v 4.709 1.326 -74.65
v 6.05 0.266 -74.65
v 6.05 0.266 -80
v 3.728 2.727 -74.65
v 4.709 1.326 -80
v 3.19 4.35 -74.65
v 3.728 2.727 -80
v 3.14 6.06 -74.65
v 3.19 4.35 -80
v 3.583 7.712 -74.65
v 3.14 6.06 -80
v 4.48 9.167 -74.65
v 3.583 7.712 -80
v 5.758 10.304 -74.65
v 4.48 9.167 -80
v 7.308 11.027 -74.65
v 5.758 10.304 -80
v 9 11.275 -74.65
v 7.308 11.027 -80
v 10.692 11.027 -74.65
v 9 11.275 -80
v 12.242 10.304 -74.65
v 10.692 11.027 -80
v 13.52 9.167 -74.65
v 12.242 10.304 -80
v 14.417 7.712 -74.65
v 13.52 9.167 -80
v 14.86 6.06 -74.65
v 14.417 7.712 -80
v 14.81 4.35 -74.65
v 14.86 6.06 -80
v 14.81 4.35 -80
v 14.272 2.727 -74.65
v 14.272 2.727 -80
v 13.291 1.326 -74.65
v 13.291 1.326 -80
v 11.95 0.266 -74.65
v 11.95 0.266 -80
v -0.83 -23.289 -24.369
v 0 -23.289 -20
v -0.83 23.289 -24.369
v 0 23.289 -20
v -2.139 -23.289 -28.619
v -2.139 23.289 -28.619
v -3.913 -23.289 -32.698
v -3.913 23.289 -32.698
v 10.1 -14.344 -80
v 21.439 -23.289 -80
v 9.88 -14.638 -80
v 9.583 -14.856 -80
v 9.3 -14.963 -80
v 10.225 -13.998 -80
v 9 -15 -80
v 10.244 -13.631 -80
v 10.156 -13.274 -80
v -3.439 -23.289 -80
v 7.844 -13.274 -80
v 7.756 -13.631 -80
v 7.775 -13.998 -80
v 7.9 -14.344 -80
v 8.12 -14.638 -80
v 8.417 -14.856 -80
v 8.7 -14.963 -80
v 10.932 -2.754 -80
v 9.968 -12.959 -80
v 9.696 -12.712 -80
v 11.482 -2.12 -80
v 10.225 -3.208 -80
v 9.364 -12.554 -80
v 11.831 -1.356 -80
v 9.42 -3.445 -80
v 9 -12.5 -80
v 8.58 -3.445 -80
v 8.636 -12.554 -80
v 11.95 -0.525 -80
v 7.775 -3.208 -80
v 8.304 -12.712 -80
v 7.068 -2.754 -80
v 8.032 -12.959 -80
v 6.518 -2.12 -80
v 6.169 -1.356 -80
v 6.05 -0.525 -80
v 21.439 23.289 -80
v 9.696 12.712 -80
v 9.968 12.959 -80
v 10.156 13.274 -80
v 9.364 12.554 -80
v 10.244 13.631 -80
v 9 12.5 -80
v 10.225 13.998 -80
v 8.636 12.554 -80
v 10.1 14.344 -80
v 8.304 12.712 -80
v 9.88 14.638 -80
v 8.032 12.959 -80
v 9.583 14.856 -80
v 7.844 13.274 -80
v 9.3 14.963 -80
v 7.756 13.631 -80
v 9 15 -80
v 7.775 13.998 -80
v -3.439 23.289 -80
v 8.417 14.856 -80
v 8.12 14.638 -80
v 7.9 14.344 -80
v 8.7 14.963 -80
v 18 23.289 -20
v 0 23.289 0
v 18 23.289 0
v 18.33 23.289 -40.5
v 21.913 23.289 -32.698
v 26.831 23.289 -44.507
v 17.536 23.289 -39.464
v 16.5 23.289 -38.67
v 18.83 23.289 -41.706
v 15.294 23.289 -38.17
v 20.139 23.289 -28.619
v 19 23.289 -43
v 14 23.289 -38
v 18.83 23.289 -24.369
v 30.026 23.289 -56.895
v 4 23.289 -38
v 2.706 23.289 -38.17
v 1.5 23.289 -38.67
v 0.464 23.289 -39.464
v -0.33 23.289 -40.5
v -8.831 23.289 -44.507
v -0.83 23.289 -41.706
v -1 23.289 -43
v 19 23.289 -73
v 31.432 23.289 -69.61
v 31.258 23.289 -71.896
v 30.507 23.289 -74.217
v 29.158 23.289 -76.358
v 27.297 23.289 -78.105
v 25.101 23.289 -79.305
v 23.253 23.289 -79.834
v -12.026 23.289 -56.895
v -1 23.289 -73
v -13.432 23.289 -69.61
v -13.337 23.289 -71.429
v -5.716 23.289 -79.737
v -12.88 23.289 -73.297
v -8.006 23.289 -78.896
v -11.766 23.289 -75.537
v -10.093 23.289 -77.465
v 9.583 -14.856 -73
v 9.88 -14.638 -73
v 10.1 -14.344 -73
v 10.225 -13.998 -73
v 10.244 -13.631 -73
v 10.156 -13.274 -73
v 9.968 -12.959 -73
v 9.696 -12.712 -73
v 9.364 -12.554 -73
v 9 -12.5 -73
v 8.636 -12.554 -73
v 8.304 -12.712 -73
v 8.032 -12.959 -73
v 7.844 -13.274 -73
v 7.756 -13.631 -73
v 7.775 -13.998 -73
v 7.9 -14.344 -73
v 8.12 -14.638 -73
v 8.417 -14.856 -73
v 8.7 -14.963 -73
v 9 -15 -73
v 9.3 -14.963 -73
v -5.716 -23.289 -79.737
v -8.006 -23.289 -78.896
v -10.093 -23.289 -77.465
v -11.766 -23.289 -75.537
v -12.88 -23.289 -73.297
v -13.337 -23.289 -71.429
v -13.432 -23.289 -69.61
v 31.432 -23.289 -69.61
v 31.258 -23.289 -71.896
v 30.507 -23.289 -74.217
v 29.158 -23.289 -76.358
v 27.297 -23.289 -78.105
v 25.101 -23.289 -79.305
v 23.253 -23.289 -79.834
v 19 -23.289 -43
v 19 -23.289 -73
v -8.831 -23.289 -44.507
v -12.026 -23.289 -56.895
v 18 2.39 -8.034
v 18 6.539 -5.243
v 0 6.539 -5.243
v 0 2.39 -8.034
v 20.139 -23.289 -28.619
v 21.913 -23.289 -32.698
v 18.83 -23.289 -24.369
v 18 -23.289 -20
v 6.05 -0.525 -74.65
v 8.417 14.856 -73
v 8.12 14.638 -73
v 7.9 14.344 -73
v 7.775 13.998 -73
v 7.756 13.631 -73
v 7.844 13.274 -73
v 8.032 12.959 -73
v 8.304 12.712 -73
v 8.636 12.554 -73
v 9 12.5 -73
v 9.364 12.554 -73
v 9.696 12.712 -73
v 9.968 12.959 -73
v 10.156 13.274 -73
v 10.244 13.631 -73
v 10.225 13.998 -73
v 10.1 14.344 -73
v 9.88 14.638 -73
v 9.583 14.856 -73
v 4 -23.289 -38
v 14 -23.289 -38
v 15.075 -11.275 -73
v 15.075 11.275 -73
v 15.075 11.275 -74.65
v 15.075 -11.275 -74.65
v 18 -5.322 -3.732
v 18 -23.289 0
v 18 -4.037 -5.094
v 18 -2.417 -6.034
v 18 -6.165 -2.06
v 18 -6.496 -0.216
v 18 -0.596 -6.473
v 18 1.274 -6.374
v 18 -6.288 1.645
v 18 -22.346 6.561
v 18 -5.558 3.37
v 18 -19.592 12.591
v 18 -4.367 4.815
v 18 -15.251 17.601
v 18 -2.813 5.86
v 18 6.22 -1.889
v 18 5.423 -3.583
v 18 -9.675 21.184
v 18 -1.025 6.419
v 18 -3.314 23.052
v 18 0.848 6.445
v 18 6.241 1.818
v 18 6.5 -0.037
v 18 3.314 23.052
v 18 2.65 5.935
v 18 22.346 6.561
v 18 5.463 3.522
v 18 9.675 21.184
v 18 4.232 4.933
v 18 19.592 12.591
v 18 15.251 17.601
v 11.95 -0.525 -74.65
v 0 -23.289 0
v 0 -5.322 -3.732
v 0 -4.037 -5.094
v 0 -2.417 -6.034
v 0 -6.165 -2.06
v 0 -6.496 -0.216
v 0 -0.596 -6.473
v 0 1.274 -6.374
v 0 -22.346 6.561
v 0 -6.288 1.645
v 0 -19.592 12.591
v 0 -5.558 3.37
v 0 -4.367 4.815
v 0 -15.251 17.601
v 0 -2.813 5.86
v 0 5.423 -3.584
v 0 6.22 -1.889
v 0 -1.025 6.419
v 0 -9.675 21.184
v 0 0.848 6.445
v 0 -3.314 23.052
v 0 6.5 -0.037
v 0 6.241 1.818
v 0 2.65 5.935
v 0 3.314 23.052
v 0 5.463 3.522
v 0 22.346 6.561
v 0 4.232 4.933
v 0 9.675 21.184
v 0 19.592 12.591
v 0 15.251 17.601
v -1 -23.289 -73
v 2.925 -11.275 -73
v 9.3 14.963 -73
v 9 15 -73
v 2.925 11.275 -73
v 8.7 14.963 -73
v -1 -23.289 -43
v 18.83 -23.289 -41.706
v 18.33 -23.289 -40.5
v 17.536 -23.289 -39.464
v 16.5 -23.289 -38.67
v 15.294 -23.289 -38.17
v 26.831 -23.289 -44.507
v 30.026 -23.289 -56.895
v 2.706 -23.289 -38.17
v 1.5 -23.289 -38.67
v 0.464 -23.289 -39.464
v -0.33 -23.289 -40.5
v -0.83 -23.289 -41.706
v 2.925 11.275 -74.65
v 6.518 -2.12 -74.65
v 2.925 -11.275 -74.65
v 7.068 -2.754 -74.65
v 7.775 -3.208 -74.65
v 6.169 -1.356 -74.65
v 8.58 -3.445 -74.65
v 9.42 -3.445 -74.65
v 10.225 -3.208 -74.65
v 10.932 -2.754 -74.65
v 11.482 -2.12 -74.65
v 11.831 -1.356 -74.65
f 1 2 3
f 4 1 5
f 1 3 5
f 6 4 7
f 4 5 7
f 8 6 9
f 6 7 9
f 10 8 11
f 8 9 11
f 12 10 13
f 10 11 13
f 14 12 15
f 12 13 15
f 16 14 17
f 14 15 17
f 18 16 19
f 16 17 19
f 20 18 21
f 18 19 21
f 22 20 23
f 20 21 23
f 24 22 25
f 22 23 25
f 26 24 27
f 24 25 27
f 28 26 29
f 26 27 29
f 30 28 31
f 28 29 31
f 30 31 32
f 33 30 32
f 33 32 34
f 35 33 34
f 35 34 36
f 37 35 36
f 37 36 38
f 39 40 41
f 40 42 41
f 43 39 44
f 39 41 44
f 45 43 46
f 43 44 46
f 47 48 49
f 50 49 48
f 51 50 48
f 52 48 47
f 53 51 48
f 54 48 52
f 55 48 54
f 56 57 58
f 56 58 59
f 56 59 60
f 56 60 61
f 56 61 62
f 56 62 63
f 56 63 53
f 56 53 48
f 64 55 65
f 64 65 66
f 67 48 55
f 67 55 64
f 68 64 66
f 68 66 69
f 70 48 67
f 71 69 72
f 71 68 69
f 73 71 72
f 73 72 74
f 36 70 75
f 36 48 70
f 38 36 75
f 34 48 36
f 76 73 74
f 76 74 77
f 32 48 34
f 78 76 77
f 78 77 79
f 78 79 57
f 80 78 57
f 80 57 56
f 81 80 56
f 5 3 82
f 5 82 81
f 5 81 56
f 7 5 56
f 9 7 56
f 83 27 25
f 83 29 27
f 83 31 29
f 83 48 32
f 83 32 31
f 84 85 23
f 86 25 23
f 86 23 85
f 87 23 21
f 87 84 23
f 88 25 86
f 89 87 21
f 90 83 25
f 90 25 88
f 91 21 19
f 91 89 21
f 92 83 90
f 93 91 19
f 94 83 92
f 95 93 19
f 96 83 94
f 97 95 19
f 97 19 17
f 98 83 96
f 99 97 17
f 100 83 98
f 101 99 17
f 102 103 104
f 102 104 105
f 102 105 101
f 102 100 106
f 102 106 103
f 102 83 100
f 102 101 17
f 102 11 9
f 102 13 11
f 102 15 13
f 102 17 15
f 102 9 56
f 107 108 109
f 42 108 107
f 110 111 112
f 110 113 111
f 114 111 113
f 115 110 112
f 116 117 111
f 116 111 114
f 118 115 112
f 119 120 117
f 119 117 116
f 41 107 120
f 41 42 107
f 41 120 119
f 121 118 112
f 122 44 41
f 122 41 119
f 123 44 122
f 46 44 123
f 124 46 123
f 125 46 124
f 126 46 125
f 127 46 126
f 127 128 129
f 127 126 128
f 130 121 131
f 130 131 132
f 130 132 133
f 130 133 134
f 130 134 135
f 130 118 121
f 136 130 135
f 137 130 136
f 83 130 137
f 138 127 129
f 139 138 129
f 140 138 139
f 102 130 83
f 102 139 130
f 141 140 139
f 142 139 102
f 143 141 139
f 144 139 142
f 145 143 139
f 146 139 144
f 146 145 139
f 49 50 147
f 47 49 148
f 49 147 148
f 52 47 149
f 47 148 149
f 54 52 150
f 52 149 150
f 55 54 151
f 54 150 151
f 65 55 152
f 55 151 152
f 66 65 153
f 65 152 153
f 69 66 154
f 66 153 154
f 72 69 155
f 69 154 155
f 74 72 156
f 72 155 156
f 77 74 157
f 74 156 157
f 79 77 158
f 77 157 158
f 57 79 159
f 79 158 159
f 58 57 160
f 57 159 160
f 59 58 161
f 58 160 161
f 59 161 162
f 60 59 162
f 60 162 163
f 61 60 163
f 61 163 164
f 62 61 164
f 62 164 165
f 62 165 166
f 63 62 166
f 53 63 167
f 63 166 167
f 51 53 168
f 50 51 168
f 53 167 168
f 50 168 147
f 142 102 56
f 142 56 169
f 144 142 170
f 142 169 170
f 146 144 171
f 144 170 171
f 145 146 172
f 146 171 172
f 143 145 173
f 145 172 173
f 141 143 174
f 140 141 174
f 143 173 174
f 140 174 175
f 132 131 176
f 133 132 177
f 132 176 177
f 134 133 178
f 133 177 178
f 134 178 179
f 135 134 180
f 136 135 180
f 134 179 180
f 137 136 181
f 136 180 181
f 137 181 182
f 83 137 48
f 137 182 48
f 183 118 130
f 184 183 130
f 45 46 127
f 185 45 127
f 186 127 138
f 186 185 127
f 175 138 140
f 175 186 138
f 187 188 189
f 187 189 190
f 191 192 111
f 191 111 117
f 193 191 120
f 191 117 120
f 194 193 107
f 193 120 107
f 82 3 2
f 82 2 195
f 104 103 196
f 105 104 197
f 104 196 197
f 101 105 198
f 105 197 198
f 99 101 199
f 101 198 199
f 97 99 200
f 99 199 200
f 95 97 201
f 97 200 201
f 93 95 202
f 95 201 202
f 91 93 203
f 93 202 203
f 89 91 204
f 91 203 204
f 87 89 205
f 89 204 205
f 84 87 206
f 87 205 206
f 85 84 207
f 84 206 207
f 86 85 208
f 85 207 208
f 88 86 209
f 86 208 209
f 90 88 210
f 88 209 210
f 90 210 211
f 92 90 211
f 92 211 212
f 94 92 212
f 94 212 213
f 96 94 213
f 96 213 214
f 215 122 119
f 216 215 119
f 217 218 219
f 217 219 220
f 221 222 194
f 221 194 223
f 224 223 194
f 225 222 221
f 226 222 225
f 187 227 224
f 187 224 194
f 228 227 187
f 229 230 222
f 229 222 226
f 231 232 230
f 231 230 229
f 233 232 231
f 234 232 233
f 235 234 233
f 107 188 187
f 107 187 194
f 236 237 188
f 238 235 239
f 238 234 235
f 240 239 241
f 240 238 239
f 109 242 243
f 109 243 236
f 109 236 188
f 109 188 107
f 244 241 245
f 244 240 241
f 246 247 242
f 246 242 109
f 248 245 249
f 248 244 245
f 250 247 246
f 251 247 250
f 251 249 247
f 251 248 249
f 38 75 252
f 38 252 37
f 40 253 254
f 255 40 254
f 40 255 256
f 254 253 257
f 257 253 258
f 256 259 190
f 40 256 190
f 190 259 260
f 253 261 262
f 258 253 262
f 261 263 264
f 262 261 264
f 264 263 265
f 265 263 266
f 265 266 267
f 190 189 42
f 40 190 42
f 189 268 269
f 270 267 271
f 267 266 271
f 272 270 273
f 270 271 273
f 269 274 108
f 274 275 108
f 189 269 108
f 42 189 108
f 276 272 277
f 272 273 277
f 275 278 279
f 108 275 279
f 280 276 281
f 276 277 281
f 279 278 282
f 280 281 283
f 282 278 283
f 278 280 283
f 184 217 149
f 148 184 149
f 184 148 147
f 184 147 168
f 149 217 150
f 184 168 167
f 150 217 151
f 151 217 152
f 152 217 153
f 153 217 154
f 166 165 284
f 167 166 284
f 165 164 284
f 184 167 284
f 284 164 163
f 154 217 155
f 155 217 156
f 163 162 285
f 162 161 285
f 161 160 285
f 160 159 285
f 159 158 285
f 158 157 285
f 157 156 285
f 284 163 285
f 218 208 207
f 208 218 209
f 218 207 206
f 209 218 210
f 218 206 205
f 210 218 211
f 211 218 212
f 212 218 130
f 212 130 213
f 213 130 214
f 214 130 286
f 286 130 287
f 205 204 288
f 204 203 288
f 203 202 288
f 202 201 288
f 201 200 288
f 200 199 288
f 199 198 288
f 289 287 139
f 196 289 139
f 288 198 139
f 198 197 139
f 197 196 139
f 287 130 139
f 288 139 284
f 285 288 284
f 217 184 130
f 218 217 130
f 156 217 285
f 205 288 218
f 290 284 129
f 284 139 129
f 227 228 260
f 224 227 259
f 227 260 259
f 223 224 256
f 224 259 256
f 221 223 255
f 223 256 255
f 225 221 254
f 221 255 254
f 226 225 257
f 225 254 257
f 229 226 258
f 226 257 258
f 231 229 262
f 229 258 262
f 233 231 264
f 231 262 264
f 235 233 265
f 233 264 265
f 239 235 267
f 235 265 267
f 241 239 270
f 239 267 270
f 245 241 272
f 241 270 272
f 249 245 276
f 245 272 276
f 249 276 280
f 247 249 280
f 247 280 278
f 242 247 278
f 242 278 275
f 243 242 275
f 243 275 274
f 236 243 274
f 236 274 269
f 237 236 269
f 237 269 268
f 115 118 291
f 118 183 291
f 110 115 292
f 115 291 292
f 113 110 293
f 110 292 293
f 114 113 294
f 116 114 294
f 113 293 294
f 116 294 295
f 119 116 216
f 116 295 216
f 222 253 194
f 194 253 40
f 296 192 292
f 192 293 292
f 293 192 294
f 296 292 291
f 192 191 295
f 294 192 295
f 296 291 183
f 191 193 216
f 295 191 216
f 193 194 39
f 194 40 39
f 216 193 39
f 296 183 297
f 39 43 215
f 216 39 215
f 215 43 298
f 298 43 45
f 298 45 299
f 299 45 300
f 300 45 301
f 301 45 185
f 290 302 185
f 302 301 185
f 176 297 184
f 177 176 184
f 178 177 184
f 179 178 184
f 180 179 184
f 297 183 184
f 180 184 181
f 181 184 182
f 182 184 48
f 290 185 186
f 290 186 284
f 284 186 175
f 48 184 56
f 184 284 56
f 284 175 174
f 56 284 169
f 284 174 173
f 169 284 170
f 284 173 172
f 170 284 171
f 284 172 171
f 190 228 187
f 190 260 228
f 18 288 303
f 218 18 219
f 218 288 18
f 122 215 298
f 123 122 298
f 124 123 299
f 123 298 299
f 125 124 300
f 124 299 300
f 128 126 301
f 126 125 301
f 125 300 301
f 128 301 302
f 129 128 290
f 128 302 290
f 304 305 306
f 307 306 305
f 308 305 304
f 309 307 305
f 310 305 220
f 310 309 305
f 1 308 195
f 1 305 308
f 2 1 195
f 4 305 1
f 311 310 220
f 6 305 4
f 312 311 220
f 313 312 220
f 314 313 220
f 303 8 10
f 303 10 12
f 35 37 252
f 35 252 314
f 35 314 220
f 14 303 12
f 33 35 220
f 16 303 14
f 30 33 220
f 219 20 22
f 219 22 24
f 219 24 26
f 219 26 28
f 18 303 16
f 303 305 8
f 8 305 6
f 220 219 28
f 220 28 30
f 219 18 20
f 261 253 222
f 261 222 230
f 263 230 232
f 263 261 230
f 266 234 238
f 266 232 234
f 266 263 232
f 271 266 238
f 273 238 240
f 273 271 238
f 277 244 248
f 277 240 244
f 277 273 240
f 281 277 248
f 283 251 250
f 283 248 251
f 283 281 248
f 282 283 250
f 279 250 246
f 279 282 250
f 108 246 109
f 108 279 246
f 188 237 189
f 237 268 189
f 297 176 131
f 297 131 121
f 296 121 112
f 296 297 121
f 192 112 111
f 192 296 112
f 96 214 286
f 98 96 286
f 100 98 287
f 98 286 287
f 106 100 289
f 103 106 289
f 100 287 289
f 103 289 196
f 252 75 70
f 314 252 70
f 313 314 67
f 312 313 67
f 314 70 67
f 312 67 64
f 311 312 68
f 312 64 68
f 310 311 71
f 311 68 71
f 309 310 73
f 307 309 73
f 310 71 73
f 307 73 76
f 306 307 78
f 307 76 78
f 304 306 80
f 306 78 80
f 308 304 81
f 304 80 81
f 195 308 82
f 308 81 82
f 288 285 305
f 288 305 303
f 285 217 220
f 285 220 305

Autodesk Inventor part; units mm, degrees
ref_plane "YZ Plane" through (0, 0, 0) normal (1, 0, 0) x (0, 1, 0)
ref_plane "XZ Plane" through (0, 0, 0) normal (0, 1, 0) x (-1, 0, 0)
ref_plane "XY Plane" through (0, 0, 0) normal (0, 0, 1) x (1, 0, 0)
sketch "Sketch28" plane through (0, 0, 0) normal (1, 0, 0) x (0, 1, 0)
  circle A0 centre (0, 0) radius 6.5
  arc A1 (23.289, 0) -> (-23.289, 0) centre (0, 0) ccw
  line L0 (23.289, 0) -> (23.289, -80)
  line L1 (-23.289, 0) -> (-23.289, -80)
  line L2 (23.289, -80) -> (-23.289, -80)
  dimension "d103" = 13
  dimension "d104" = 46.578
  dimension "d105" = 80
  dimension "d106" = 80
extrude "Extrusion23" add sketch "Sketch28" along normal blind 18
sketch "Sketch29" plane through (0, 23.289, 0) normal (0, 1, 0) x (1, 0, 0)
  line L0 (31.5, 80) -> (-13.5, 80)
  line L1 (-13.5, 80) -> (-13.5, 45)
  line L2 (-13.5, 45) -> (31.5, 45)
  line L3 (31.5, 45) -> (31.5, 80)
  line L4 (0, 80) -> (18, 80) projected
  line L5 (18, 0) -> (18, 80) projected
  arc A0 (31.5, 45) -> (18, 20) centre (57.6517, 14.7331) ccw
  line L6 (9, 88.5963) -> (9, -26.2001) construction
  arc A1 (0, 20) -> (-13.5, 45) centre (-39.6517, 14.7331) ccw
  line L7 (0, 80) -> (0, 0) projected
  point P0 (9, 80)
  point P1 (9, 45)
  point P2 (0, 45)
  point P3 (18, 45)
  dimension "d109" = 45
  dimension "d110" = 0
  dimension "d111" = 35
  dimension "d112" = 22.5
  dimension "d115" = 40
  dimension "d116" = 25
extrude "Extrusion24" add sketch "Sketch29" against normal up to surface (46.578 mm away)
fillet "Fillet9" radius 90 2 edges at (31.5, 0, -45) (-13.5, 0, -45)
sketch "Sketch30" plane through (0, 23.289, 0) normal (0, 1, 0) x (1, 0, 0)
  line L0 (19, 73) -> (-1, 73)
  line L1 (-1, 73) -> (-1, 38)
  line L2 (-1, 38) -> (19, 38)
  line L3 (19, 38) -> (19, 73)
  line L4 (-13.5, 80) -> (31.5, 80) projected
  point P0 (0, 0)
  dimension "d120" = 7
  dimension "d121" = 20
  dimension "d122" = 12.5
  dimension "d123" = 35
extrude "Extrusion25" cut sketch "Sketch30" against normal through all
fillet "Fillet10" radius 5 2 edges at (19, 0, -38) (-1, 0, -38)
fillet "Fillet11" radius 10 2 edges at (-13.5, 0, -80) (31.5, 0, -80)
sketch "Sketch31" plane through (21.4392, -23.289, -80) normal (0, 0, -1) x (-1, 0, 0)
  arc A0 (15.3892, 23.5545) -> (9.4892, 23.5545) centre (12.4392, 28.664) ccw projected
  line L0 (15.3892, 23.5545) -> (15.3892, 22.764) projected
  arc A1 (9.4892, 22.764) -> (15.3892, 22.764) centre (12.4392, 22.764) ccw projected
  line L1 (9.4892, 22.764) -> (9.4892, 23.5545) projected
  point P0 (21.4392, 23.289)
extrude "Extrusion26" cut sketch "Sketch31" against normal blind 20
sketch "Sketch34" plane through (-1, 23.289, -73) normal (0, 0, 1) x (1, 0, 0)
  line L0 (3.925, -12.014) -> (16.075, -12.014)
  line L1 (16.075, -12.014) -> (16.075, -34.564)
  line L2 (16.075, -34.564) -> (3.925, -34.564)
  line L3 (3.925, -34.564) -> (3.925, -12.014)
  line L4 (1, 0) -> (19, 0) projected
  arc A0 (12.95, -23.0235) -> (7.05, -23.0235) centre (10, -17.914) ccw projected
  point P0 (1, -23.289)
  point P1 (10, 0)
  dimension "d130" = 12.014
  dimension "d131" = 22.55
  dimension "d132" = 12.15
  dimension "d133" = 6.075
extrude "Extrusion27" cut sketch "Sketch34" against normal blind 1.65
sketch "Sketch36" plane through (-1, 23.289, -73) normal (0, 0, 1) x (1, 0, 0)
  arc A0 (10.5833, -38.1445) -> (9.4167, -38.1445) centre (10, -37.039) ccw projected
  arc A1 (9.4167, -8.4335) -> (10.5833, -8.4335) centre (10, -9.539) ccw projected
  circle A2 centre (10, -9.539) radius 1.25
  circle A3 centre (10, -37.039) radius 1.25
  point P0 (1, -23.289)
  point P1 (10.5833, -8.4335)
  point P2 (9.4167, -8.4335)
  point P3 (9.4167, -38.1445)
  point P4 (10.5833, -38.1445)
extrude "Extrusion28" cut sketch "Sketch36" against normal through all
sketch "Sketch37" plane through (0, 0, 0) normal (-1, 0, 0) x (0, 0, 1)
  line L0 (-6.3739, 1.2741) -> (-8.0335, 2.3902) projected
  line L1 (-3.5835, 5.423) -> (-5.243, 6.5392) projected
  line L2 (-5.243, 6.5392) -> (-8.0335, 2.3902) projected
  circle A0 centre (0, 0) radius 6.5 projected
extrude "Extrusion29" cut sketch "Sketch37" against normal through all
sketch "Sketch38" plane through (0, 23.289, 0) normal (0, 1, 0) x (1, 0, 0)
  line L0 (-25.331, 0) -> (24.4324, 0)
  line L1 (0, 0) -> (18, 0) projected
  line L2 (9, 31.2847) -> (9, -25.5557)
  line L3 (0, -23.289) -> (18, -23.289) projected
  line L4 (14, 38) -> (4, 38) projected
  arc A0 (-1, 43) -> (4, 38) centre (4, 43) ccw projected
  line L5 (-1, 43) -> (-1, 73) projected
  line L6 (-1, 73) -> (19, 73) projected
  line L7 (19, 73) -> (19, 43) projected
  arc A1 (14, 38) -> (19, 43) centre (14, 43) ccw projected
  arc A2 (31.4316, 69.6103) -> (21.4392, 80) centre (21.4392, 70) ccw projected
  line L8 (-3.4392, 80) -> (21.4392, 80) projected
  arc A3 (-3.4392, 80) -> (-13.4316, 69.6103) centre (-3.4392, 70) ccw projected
  arc A4 (-13.4316, 69.6103) -> (-3.9127, 32.6976) centre (76.5, 73.1178) ccw projected
  arc A5 (0, 20) -> (-3.9127, 32.6976) centre (-39.6517, 14.7331) ccw projected
  line L9 (0, 20) -> (0, 0) projected
  line L10 (0, 0) -> (18, 0) projected
  line L11 (18, 20) -> (18, 0) projected
  arc A6 (21.9127, 32.6976) -> (18, 20) centre (57.6517, 14.7331) ccw projected
  arc A7 (21.9127, 32.6976) -> (31.4316, 69.6103) centre (-58.5, 73.1178) ccw projected
  circle A8 centre (9, 0) radius 2.5
  dimension "d140" = 0
  dimension "d141" = 9
  dimension "d142" = 5
properties part number "Link Three" material "ABS Plastic"
